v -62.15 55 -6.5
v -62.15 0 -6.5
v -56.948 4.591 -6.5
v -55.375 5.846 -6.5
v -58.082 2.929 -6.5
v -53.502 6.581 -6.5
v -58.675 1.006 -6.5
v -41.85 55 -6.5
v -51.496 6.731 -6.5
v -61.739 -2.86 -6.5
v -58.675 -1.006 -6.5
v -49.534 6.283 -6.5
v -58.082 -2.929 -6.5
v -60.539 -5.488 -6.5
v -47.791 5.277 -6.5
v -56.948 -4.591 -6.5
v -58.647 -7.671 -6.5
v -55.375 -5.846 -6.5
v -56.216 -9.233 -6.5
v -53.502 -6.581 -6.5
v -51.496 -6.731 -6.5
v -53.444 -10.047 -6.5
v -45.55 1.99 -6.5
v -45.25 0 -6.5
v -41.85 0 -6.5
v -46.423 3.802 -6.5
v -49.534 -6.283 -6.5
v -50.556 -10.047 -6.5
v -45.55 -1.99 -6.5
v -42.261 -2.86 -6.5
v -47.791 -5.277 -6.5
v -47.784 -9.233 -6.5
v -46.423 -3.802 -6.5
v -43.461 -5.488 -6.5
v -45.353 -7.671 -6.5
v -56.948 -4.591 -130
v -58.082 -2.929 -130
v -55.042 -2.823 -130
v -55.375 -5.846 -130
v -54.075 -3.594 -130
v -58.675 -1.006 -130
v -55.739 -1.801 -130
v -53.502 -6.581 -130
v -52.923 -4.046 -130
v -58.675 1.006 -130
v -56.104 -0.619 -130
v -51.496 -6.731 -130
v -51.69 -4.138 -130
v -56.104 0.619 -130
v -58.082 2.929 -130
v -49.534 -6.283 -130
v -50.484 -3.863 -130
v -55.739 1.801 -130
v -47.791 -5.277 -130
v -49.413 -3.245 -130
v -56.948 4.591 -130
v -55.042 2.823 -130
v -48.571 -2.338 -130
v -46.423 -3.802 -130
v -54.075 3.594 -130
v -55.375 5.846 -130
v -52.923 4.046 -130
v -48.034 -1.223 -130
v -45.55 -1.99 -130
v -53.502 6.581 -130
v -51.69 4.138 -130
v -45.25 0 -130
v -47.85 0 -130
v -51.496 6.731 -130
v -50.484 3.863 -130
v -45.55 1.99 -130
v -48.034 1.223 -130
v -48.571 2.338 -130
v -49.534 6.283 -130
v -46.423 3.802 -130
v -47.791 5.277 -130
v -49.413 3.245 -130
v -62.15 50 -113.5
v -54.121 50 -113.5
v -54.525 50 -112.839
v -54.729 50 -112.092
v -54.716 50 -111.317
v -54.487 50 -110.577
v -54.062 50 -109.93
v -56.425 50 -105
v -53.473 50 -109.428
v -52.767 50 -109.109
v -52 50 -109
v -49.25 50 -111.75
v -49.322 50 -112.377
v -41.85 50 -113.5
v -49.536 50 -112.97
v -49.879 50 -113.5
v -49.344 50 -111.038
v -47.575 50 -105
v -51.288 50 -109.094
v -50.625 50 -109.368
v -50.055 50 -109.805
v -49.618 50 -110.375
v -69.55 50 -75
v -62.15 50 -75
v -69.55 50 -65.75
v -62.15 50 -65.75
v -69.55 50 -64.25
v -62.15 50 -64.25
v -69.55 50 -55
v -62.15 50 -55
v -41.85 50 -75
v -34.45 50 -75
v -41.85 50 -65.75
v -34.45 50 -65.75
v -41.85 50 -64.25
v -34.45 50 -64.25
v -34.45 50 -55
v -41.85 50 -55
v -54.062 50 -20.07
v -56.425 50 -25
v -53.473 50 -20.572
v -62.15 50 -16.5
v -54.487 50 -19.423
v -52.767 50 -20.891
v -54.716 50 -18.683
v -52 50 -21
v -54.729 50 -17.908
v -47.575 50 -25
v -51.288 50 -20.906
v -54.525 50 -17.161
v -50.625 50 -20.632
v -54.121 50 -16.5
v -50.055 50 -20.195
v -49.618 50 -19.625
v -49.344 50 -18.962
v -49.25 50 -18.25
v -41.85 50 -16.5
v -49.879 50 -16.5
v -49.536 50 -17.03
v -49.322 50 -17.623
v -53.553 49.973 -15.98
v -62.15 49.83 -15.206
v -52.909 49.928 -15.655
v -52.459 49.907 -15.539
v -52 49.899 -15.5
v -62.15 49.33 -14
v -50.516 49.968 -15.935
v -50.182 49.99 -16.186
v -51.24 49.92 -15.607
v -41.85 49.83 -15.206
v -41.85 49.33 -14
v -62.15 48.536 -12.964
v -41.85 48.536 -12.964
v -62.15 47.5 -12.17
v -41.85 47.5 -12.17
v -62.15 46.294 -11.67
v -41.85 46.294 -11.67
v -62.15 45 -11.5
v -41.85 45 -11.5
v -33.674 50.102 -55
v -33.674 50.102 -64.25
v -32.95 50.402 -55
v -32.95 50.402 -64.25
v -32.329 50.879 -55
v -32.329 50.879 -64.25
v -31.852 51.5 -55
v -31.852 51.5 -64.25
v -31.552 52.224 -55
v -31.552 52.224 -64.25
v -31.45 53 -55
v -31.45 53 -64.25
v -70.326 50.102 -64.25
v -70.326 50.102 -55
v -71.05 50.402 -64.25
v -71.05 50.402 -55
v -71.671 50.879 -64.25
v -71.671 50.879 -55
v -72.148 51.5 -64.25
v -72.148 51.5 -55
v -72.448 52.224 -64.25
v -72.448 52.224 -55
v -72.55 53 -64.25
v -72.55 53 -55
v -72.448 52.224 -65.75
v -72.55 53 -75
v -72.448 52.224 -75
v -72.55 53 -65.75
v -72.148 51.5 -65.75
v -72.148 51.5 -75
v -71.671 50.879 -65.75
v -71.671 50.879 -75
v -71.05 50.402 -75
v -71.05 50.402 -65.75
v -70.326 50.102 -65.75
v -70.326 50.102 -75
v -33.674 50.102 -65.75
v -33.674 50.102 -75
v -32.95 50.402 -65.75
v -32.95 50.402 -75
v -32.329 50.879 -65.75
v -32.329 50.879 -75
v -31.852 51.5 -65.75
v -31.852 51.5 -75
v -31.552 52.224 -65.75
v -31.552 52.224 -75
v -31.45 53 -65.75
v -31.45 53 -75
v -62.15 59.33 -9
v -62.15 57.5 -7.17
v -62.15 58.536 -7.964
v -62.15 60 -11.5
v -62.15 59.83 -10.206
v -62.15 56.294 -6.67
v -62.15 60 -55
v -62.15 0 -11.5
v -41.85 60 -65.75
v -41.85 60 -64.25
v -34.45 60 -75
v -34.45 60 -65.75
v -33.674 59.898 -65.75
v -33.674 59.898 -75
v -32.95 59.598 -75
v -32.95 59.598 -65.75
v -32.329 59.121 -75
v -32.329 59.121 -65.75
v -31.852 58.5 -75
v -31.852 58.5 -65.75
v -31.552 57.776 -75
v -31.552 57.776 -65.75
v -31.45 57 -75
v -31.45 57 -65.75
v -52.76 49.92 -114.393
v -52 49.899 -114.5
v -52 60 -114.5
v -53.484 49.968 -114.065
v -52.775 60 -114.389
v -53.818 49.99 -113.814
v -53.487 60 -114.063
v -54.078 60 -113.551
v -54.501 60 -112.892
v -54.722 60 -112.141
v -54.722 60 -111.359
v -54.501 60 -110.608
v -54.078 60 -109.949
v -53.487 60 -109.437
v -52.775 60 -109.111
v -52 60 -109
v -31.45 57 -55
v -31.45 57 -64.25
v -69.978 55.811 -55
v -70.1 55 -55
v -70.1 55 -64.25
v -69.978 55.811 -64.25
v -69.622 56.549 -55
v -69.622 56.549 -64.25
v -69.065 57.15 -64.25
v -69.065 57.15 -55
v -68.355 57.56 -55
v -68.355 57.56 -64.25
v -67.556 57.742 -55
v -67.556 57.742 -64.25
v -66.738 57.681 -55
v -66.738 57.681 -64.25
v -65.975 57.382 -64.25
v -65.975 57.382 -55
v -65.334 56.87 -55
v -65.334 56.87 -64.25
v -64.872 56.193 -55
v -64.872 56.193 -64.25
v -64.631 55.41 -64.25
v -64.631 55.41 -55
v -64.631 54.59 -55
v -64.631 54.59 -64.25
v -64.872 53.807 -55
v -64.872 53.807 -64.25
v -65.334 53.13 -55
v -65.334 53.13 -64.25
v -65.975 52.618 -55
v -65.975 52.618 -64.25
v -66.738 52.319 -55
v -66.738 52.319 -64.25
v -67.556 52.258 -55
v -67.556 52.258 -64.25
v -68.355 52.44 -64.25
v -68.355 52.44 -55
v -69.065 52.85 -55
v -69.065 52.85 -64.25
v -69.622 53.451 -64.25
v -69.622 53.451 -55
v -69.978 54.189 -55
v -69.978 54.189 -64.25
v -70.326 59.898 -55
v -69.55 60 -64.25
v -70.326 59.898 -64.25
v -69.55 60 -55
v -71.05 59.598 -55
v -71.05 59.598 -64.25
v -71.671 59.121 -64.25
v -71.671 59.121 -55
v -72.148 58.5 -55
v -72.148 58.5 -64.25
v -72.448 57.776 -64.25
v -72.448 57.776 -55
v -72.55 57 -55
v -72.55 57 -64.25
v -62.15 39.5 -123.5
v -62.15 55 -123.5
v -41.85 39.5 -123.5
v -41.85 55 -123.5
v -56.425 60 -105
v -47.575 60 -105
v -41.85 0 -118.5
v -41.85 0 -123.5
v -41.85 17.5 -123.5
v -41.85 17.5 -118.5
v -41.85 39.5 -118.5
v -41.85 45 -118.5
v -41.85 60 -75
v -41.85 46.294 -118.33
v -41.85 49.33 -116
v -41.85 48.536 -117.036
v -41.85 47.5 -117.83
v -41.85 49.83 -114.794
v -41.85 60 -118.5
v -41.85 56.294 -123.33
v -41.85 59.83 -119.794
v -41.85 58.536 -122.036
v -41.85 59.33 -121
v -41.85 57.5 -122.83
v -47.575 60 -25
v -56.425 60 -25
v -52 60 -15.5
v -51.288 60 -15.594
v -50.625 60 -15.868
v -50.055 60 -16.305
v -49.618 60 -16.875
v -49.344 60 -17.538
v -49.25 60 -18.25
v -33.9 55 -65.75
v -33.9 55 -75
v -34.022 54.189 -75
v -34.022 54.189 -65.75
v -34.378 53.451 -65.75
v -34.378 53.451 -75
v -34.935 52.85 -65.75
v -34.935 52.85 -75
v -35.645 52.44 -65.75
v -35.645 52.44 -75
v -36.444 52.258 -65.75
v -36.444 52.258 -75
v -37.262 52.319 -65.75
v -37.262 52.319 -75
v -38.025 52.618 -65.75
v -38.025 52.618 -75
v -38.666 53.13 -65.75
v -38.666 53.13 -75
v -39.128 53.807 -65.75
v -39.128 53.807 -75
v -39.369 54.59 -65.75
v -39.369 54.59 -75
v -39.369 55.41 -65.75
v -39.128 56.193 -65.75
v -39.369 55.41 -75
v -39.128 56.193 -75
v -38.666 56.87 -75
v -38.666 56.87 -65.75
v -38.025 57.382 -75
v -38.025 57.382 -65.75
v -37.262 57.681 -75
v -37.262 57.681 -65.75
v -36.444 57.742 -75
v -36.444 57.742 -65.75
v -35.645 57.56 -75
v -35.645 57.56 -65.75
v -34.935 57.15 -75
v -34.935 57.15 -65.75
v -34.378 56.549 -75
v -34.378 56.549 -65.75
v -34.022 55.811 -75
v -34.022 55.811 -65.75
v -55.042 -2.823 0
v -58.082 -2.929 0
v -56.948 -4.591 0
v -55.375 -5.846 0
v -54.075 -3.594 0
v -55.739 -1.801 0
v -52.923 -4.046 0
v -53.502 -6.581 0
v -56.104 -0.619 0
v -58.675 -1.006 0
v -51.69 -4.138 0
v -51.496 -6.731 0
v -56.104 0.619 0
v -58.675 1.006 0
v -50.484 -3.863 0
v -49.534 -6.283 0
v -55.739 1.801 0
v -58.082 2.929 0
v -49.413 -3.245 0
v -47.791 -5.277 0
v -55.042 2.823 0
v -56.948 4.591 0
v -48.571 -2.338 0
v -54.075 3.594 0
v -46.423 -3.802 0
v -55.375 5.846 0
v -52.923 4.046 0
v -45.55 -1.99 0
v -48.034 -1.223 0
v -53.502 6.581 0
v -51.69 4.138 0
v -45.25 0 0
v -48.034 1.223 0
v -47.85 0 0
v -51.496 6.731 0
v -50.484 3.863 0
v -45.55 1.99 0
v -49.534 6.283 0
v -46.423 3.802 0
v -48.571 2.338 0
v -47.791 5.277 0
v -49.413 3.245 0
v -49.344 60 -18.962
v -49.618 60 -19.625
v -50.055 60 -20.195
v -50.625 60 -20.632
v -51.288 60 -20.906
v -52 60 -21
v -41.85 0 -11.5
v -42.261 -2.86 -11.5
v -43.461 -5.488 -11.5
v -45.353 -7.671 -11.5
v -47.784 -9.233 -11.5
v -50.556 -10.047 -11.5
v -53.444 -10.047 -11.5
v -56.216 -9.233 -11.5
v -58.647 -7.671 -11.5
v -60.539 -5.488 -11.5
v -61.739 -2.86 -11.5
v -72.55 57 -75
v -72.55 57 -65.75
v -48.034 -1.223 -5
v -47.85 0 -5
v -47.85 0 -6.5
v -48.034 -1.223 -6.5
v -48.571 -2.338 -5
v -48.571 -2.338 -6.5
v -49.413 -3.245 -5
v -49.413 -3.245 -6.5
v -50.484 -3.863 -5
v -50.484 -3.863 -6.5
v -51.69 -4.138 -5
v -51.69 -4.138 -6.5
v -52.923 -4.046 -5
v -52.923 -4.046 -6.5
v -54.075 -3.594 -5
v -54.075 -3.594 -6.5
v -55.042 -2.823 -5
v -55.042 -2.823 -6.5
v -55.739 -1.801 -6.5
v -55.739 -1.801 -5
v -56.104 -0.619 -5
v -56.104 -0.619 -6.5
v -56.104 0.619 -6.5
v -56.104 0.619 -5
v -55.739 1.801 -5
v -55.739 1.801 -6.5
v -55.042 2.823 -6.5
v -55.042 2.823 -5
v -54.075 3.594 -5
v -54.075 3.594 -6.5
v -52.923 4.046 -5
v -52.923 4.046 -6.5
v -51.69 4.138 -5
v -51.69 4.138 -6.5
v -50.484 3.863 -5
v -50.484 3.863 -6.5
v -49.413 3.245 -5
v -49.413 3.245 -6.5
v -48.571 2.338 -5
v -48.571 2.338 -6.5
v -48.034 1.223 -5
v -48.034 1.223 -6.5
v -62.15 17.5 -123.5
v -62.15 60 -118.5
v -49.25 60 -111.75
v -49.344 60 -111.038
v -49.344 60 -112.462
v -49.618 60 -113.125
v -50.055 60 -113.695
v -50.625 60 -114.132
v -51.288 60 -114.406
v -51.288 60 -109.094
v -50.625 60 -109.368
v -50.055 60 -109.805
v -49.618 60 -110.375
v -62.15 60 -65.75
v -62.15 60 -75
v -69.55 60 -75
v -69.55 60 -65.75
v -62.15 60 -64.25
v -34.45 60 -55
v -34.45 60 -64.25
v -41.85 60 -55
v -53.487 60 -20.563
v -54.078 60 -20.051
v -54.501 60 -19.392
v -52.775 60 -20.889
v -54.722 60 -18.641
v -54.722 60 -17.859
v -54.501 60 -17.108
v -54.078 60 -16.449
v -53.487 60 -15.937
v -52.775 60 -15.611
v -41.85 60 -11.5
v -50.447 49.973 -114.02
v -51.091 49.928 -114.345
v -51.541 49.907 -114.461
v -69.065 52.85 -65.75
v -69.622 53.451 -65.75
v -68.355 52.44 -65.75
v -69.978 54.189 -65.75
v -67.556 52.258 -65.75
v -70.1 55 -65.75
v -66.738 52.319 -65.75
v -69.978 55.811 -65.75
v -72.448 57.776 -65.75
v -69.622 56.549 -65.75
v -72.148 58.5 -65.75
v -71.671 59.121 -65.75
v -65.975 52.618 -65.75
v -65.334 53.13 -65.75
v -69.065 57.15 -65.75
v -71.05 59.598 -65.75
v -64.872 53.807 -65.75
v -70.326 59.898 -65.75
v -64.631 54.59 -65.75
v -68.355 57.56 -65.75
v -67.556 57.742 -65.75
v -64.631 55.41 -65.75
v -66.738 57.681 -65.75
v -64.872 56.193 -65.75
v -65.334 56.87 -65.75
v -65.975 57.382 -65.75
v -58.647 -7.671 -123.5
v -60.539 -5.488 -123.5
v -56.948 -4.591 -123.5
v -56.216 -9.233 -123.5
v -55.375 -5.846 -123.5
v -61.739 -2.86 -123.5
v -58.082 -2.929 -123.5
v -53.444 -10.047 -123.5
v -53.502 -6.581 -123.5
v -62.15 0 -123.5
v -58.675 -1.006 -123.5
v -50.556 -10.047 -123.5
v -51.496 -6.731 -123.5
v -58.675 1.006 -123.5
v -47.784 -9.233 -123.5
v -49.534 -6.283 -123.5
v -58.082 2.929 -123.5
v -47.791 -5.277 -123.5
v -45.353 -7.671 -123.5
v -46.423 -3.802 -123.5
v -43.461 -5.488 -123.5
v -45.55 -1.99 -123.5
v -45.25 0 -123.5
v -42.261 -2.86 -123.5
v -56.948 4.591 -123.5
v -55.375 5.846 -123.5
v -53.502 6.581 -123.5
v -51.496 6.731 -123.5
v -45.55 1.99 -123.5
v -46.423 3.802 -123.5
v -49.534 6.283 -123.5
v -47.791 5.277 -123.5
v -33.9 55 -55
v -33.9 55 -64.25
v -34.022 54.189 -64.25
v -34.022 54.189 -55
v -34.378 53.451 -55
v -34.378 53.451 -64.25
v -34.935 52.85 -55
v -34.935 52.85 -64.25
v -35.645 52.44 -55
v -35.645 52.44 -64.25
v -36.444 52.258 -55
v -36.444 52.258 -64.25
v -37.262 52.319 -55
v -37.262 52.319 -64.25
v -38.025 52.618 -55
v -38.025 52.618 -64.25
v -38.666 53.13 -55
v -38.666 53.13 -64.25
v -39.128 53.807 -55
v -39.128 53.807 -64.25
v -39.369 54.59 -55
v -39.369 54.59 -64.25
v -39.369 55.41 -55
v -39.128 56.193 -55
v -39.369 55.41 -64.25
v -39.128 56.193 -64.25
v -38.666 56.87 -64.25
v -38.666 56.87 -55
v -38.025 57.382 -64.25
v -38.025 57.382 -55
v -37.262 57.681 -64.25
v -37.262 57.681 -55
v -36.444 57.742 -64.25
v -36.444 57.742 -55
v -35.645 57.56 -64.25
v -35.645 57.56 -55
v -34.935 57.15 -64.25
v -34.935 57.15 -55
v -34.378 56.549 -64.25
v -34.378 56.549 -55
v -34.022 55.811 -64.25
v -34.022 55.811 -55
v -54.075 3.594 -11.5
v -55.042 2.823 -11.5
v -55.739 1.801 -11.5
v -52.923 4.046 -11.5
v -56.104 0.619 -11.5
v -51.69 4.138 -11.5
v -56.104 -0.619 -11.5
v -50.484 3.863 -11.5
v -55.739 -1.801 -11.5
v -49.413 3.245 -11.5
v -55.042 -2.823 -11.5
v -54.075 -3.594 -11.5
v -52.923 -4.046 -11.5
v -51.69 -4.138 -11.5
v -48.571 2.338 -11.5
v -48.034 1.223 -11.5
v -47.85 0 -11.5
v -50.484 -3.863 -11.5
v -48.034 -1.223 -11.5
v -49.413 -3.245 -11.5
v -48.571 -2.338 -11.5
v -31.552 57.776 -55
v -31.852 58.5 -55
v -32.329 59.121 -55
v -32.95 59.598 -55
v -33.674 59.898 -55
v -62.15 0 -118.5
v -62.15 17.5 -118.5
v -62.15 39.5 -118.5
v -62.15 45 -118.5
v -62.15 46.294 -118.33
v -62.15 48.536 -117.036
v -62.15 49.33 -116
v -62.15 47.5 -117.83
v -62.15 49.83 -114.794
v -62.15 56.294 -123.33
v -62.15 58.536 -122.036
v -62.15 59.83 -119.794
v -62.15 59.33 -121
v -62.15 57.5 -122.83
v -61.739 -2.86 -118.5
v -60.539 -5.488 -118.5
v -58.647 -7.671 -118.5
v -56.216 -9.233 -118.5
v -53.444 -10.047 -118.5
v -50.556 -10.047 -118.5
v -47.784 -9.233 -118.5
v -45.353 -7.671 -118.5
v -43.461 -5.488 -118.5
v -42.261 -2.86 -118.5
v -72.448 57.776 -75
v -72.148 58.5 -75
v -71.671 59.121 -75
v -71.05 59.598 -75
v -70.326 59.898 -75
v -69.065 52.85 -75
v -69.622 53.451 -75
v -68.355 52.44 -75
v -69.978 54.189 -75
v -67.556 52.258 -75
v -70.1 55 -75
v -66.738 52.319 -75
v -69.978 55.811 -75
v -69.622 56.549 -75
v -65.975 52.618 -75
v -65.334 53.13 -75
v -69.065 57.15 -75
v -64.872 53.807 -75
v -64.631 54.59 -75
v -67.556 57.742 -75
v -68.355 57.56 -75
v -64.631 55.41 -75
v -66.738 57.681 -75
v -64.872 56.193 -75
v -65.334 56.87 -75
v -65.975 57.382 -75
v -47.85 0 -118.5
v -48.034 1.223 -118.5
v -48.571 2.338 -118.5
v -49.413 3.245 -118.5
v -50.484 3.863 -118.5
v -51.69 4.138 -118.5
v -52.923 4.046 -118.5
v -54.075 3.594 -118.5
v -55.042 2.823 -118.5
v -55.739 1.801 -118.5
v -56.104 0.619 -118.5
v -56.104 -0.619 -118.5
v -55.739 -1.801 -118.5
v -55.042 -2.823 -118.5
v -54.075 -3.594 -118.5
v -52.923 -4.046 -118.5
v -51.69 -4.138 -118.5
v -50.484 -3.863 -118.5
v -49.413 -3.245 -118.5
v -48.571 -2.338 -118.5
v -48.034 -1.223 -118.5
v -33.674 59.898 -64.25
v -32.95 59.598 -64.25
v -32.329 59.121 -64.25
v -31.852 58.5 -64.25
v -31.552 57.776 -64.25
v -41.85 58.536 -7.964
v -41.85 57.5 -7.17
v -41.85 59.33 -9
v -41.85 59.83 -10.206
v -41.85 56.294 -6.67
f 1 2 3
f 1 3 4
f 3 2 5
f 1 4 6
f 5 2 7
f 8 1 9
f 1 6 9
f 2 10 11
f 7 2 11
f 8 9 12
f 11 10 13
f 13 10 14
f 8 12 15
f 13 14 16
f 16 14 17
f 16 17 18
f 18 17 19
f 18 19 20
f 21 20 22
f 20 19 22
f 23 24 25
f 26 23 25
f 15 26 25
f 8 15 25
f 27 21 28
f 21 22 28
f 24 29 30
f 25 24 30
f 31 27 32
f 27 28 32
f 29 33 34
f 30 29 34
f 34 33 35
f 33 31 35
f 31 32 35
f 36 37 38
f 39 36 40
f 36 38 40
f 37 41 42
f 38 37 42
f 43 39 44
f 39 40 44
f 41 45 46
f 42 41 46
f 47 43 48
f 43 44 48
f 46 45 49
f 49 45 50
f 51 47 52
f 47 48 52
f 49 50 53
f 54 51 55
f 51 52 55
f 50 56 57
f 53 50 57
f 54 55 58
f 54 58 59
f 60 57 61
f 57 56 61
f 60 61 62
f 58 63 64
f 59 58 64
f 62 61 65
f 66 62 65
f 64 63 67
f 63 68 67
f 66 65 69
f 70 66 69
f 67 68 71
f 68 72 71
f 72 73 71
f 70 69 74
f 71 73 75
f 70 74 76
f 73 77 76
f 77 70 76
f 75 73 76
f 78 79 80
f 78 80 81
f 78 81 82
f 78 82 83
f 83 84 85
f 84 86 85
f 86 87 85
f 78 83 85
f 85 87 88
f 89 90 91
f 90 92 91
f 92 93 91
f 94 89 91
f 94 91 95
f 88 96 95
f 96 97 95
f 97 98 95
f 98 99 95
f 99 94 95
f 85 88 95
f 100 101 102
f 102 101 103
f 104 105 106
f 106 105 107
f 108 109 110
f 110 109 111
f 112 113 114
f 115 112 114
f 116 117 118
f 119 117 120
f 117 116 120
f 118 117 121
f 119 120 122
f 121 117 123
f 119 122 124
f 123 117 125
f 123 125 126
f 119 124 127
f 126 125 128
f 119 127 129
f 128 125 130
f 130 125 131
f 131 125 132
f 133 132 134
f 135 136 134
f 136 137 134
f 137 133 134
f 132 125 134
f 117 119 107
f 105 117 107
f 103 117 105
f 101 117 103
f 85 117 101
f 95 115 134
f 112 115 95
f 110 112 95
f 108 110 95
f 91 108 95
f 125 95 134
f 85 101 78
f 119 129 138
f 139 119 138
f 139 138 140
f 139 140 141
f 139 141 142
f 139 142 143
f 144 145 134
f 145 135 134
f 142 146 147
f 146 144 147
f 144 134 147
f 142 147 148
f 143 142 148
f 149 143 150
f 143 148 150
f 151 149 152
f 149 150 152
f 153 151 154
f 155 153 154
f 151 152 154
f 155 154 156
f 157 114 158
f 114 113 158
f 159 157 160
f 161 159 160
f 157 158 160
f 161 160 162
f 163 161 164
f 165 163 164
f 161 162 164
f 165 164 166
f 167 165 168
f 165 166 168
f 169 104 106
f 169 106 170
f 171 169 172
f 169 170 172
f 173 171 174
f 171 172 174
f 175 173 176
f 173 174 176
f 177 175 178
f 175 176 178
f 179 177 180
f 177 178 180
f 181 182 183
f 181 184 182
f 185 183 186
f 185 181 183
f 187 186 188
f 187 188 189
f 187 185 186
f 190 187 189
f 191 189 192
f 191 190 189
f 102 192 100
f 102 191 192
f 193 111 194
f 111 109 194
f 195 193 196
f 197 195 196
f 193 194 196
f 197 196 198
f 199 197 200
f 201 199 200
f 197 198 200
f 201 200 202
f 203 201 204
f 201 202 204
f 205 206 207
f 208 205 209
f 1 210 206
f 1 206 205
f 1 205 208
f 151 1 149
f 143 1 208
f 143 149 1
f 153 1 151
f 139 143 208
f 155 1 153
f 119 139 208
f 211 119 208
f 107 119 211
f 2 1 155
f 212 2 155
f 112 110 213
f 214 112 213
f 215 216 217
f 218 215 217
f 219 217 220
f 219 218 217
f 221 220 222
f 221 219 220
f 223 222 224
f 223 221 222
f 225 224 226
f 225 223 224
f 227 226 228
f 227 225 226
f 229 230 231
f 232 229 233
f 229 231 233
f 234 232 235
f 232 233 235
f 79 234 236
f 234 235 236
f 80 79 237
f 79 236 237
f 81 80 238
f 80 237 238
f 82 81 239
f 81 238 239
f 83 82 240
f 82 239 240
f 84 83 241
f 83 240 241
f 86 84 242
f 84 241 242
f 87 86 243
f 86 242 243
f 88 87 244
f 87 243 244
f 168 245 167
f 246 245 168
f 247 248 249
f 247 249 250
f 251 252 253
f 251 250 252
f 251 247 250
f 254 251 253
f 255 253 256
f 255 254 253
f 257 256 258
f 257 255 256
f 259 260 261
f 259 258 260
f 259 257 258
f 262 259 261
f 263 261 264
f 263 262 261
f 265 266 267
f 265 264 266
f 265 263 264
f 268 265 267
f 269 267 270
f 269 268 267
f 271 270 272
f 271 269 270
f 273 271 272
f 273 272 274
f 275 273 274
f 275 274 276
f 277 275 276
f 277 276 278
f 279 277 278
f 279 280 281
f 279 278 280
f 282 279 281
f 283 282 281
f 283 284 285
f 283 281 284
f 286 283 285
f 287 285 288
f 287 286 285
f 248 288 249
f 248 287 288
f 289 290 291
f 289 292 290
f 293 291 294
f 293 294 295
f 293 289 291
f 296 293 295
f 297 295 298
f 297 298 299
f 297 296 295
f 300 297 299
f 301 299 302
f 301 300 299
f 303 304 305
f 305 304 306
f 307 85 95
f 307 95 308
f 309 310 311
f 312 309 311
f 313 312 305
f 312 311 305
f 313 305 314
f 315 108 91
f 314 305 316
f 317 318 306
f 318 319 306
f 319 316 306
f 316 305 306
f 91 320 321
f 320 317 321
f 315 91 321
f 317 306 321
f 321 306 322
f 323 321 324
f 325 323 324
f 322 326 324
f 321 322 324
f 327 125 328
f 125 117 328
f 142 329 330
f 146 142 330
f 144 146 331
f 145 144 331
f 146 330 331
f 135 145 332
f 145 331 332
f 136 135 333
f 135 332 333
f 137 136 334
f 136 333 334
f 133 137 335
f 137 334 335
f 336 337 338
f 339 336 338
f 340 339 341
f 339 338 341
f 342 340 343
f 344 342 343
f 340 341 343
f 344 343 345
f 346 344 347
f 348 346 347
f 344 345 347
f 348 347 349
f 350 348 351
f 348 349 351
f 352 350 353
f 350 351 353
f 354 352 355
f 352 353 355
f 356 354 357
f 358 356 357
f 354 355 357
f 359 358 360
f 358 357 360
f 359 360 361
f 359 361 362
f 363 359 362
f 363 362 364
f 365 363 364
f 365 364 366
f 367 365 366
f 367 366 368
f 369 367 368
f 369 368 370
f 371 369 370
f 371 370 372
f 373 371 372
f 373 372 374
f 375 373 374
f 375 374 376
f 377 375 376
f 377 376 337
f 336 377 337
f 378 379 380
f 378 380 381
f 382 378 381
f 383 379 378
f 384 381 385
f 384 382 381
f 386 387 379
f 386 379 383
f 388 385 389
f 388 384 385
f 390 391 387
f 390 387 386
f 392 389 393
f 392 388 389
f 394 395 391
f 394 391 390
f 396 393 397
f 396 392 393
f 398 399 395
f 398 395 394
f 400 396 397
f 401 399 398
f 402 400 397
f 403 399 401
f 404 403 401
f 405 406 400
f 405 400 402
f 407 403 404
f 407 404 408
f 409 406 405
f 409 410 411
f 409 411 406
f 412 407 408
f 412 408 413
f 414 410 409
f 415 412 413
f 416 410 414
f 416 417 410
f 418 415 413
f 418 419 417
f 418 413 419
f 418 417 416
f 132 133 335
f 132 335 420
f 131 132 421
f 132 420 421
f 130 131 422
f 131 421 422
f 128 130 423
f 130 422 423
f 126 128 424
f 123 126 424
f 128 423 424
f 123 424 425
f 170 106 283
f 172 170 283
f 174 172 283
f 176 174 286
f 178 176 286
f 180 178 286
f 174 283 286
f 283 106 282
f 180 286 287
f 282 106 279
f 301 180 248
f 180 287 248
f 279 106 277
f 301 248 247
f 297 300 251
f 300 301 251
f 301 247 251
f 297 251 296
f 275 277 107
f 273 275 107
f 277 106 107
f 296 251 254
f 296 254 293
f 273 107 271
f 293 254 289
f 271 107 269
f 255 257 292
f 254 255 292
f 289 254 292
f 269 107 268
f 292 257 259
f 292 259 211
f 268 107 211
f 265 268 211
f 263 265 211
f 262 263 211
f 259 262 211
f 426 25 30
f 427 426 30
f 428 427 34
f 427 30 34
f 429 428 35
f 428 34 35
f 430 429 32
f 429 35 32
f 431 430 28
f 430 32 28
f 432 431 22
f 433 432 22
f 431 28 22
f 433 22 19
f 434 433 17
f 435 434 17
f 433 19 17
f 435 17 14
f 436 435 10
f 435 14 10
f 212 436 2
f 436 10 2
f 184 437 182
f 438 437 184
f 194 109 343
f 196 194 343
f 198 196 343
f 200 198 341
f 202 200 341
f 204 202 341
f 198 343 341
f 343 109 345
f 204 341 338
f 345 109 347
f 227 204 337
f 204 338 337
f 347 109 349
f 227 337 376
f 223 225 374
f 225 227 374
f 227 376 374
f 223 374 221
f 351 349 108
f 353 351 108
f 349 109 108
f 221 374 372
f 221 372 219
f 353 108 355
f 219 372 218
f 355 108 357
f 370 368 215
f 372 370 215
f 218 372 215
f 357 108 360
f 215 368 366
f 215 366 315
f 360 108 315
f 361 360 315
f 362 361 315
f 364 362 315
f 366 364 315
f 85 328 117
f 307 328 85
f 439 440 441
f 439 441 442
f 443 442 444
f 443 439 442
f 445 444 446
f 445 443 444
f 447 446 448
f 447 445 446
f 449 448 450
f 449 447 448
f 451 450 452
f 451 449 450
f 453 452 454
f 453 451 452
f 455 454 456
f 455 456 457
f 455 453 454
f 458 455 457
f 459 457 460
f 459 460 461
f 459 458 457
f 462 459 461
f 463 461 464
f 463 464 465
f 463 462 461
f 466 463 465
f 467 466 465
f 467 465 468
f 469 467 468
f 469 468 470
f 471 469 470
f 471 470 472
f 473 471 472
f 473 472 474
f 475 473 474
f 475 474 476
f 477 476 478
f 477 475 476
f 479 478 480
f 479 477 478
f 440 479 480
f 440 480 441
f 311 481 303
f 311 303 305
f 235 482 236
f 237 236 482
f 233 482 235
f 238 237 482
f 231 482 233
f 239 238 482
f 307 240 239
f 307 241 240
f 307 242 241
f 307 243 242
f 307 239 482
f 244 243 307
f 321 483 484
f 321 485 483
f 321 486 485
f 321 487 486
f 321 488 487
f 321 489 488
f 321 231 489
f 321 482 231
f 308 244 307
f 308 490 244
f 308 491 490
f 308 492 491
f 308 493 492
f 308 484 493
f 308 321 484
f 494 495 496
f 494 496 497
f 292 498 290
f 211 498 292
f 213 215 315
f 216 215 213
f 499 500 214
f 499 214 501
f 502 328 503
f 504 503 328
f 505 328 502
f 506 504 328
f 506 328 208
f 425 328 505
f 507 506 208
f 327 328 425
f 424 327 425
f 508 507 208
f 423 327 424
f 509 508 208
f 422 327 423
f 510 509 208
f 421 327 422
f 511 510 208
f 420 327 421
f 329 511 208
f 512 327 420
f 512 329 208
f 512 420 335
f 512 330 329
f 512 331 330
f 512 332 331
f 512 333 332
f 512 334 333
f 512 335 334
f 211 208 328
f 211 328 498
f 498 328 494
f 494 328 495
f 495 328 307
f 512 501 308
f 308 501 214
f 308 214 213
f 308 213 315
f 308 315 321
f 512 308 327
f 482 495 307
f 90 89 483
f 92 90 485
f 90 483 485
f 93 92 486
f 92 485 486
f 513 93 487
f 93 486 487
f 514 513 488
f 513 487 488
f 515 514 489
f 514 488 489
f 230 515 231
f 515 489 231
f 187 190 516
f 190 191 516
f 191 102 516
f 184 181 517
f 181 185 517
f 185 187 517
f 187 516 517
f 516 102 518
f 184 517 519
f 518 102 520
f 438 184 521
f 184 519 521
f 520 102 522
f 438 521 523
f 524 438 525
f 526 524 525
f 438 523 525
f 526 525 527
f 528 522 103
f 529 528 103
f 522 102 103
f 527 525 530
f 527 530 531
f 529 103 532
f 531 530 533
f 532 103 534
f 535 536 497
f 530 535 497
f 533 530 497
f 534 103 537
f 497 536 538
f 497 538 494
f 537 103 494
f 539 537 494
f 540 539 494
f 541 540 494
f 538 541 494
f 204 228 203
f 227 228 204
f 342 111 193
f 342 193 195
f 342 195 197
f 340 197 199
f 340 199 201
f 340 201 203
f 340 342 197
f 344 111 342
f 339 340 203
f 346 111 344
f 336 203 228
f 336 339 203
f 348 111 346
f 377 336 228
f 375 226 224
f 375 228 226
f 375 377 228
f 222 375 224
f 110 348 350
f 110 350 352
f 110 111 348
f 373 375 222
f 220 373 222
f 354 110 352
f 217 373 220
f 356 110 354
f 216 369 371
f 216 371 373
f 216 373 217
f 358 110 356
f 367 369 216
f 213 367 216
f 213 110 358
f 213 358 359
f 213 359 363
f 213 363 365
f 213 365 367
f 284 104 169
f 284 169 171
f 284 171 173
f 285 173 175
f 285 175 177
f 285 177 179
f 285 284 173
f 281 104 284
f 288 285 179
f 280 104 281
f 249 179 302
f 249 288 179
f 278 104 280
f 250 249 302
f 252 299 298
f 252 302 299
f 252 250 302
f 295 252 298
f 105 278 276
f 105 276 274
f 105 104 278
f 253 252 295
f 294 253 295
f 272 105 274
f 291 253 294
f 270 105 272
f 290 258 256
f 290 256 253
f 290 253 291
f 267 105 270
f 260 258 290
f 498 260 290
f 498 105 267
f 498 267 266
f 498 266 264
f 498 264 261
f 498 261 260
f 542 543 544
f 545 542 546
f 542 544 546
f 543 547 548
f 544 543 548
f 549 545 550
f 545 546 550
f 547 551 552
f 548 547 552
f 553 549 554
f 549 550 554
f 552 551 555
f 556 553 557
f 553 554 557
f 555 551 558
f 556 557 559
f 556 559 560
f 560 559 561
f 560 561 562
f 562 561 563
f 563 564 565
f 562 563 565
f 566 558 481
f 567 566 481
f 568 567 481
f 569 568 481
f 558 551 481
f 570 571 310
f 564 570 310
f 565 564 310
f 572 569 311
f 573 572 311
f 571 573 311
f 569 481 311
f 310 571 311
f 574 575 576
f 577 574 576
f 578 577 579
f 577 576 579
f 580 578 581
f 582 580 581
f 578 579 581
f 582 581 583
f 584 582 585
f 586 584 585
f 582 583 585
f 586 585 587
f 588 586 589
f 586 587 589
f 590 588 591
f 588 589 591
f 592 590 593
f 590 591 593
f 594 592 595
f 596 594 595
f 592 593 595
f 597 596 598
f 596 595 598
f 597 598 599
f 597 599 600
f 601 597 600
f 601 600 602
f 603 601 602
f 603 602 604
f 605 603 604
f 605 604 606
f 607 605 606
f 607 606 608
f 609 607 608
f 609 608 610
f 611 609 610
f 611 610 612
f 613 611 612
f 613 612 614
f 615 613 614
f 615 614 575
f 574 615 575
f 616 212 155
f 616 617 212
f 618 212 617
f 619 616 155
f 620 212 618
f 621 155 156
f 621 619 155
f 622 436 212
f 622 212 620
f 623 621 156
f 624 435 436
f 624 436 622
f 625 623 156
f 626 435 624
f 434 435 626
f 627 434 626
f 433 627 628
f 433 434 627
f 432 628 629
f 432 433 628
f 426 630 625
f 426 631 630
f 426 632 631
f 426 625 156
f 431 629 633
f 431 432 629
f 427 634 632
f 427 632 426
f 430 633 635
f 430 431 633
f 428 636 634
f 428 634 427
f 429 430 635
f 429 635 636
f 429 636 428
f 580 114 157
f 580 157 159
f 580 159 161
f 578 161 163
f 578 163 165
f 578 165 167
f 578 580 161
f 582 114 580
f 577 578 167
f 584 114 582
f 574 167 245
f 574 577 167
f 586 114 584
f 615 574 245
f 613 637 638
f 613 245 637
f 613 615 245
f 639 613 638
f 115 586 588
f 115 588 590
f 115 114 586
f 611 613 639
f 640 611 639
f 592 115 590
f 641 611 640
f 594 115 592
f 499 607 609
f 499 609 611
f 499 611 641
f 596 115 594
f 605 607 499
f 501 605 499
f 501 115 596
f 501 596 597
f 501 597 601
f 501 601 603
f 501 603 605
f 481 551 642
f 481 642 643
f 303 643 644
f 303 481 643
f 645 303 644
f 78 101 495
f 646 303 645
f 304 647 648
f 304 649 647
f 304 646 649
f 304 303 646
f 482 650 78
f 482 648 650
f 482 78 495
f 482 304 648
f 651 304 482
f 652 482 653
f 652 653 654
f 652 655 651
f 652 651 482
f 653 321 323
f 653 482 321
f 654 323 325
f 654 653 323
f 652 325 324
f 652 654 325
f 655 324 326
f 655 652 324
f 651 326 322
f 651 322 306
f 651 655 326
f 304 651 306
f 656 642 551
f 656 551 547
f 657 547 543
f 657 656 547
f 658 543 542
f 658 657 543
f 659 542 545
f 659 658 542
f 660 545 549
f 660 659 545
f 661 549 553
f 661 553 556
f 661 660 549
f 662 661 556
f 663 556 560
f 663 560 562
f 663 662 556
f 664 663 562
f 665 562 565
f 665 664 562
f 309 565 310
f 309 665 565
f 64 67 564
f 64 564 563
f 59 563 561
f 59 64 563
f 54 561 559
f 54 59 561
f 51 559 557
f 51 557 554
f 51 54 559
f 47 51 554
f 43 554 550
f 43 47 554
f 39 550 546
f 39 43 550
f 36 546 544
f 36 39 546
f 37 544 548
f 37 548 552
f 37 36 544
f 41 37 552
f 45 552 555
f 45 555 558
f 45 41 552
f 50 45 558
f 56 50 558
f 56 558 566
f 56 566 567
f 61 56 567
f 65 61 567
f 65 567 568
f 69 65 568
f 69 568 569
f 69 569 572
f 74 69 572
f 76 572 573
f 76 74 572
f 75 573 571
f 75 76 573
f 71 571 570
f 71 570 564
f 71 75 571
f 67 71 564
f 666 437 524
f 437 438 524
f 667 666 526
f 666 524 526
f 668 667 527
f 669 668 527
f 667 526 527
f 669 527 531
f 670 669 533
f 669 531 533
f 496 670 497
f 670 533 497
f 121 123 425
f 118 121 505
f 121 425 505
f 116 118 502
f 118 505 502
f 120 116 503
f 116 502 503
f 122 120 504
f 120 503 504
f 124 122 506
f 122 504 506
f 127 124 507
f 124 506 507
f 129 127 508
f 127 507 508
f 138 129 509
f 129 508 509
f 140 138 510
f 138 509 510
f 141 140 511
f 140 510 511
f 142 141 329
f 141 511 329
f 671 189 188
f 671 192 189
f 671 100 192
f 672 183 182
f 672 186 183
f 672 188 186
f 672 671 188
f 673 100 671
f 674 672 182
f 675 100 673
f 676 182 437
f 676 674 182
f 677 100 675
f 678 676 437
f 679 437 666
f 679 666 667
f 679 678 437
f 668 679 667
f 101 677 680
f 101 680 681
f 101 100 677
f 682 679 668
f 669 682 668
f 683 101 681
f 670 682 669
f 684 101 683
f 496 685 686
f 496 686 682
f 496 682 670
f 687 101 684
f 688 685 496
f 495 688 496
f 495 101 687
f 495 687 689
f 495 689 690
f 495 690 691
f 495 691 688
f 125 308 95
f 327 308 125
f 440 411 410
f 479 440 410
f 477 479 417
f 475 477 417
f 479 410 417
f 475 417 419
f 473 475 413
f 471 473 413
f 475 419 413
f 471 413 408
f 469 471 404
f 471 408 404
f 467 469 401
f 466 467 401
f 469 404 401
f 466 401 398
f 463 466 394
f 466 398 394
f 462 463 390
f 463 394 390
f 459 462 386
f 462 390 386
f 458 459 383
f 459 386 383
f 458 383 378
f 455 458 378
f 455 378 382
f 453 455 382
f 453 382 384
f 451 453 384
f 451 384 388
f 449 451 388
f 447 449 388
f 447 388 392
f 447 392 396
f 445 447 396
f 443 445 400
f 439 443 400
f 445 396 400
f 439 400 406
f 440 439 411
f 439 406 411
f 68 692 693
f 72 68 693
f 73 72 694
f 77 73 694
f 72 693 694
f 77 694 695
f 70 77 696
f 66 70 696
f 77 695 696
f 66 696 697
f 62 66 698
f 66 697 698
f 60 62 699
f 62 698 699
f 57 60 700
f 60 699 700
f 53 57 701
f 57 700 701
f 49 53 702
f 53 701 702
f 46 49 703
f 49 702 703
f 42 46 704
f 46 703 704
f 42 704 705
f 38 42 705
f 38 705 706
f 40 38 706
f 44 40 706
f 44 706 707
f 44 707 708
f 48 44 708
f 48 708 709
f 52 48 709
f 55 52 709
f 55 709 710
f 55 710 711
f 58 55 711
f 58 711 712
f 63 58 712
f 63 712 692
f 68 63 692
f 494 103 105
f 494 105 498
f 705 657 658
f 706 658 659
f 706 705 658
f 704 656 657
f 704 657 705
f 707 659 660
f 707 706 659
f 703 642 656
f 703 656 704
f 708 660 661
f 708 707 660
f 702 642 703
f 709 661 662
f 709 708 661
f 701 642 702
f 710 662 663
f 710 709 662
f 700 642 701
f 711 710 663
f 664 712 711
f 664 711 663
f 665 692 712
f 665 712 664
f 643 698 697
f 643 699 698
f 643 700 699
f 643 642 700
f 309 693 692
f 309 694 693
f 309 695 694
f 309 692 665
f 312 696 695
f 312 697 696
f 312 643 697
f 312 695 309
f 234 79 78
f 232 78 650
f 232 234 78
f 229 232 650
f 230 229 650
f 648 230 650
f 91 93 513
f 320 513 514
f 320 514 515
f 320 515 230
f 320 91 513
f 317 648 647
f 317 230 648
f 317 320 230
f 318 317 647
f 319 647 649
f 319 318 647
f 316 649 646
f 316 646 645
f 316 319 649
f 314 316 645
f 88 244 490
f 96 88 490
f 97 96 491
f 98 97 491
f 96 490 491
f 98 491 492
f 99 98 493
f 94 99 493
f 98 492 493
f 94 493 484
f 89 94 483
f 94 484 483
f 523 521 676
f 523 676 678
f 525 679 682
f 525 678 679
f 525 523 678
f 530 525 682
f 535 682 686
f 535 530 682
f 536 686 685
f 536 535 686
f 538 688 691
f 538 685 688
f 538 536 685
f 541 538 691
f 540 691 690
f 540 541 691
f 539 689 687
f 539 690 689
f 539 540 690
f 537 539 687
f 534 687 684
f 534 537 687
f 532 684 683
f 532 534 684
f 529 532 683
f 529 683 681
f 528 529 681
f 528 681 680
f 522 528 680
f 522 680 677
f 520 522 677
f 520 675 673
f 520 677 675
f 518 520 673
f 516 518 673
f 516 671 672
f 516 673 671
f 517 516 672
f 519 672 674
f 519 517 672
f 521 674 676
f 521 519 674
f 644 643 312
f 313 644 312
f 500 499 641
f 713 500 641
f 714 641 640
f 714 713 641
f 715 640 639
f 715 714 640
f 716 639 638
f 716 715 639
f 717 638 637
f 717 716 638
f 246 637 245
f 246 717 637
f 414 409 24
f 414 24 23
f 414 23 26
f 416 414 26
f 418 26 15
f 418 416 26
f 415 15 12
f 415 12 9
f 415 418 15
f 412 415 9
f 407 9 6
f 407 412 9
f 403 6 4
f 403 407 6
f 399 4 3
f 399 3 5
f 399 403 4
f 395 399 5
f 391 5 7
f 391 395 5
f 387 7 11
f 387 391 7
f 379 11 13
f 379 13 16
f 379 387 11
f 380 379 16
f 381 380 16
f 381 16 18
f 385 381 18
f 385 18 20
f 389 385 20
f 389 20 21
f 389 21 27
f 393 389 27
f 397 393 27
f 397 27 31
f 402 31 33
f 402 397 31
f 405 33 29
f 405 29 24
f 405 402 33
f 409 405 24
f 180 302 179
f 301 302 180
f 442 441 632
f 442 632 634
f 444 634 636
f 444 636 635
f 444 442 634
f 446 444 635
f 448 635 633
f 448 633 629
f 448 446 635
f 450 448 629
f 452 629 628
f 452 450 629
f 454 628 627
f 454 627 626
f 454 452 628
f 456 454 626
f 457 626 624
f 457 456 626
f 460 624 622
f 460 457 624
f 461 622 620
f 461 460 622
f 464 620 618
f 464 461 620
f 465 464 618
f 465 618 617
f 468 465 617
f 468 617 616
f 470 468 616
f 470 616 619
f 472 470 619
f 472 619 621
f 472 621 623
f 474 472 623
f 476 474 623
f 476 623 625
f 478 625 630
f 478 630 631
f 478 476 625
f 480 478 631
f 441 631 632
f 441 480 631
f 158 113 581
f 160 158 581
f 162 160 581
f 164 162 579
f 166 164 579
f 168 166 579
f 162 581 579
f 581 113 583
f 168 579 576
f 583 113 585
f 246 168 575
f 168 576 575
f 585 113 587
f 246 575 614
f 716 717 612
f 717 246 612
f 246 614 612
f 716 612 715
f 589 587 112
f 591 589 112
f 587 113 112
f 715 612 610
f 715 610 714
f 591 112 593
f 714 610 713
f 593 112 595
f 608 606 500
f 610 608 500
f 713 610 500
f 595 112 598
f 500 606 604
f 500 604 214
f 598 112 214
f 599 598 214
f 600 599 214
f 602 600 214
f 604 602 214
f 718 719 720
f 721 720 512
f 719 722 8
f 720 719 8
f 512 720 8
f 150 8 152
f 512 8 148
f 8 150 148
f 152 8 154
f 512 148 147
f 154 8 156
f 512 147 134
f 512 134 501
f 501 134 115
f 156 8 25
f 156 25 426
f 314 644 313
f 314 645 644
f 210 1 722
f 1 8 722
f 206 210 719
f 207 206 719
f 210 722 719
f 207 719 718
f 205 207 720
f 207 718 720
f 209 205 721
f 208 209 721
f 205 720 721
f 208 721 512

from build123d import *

# Parameters (mm, degrees)
SKETCH1_R               = 7.15
SKETCH1_R_2             = 4.15
BOSS_EXTRUDE1_DEPTH     = 5
SKETCH2_R               = 7.15
SKETCH2_R_2             = 4.15
BOSS_EXTRUDE2_DEPTH     = 5
BOSS_EXTRUDE3_START     = 1.5
SKETCH3_R               = 7.15
SKETCH3_R_2             = 4.15
BOSS_EXTRUDE3_DEPTH     = 1.5
SKETCH4_R               = 7.15
SKETCH4_R_2             = 4.15
BOSS_EXTRUDE4_DEPTH     = 1.5
SKETCH5_R               = 7.15
SKETCH5_R_2             = 4.15
BOSS_EXTRUDE5_DEPTH     = 5
BOSS_EXTRUDE6_START     = 5
SKETCH6_R               = 4.15
BOSS_EXTRUDE6_DEPTH     = 5
SKETCH7_W               = 20.3
SKETCH7_H               = 10
BOSS_EXTRUDE7_DEPTH     = 107
SKETCH8_R               = 4.15
CUT_EXTRUDE1_DEPTH      = 153.570131415
FILLET1_R               = 5
CUT_EXTRUDE3_DEPTH      = 18.9
SKETCH11_R              = 7.15
SKETCH11_R_2            = 6.75
CUT_EXTRUDE4_DEPTH      = 6.5
SKETCH12_R              = 7.15
SKETCH12_R_2            = 6.75
CUT_EXTRUDE5_DEPTH      = 6.5
CUT_EXTRUDE6_DEPTH      = 18.9
SKETCH14_W              = 9.25
SKETCH14_H              = 10
BOSS_EXTRUDE8_DEPTH     = 0.4
SKETCH15_W              = 9.25
SKETCH15_H              = 10
BOSS_EXTRUDE9_DEPTH     = 0.4
SKETCH17_W              = 9.25
SKETCH17_H              = 10
BOSS_EXTRUDE10_DEPTH    = 10
CUT_EXTRUDE7_DEPTH      = 26
SKETCH20_W              = 9.25
SKETCH20_H              = 10
BOSS_EXTRUDE11_DEPTH    = 10
CUT_EXTRUDE8_DEPTH      = 112.751968699
CUT_EXTRUDE8_DEPTH_BACK = 112.751968699
FILLET2_R               = 3
SKETCH23_W              = 117
SKETCH23_H              = 2
CUT_EXTRUDE9_DEPTH      = 37
SKETCH24_W              = 20.3
SKETCH24_H              = 5
BOSS_EXTRUDE12_DEPTH    = 22
SKETCH25_W              = 80
SKETCH25_H              = 10
CUT_EXTRUDE10_DEPTH     = 0.2
SKETCH26_W              = 80
SKETCH26_H              = 10
CUT_EXTRUDE11_DEPTH     = 0.2


with BuildPart() as part:
    # Sketch1 → Boss-Extrude1 (new body)
    with BuildSketch(Plane.XY):
        with Locations((-52, 0)):
            Circle(SKETCH1_R)
        with Locations((-52, 0)):
            Circle(SKETCH1_R_2, mode=Mode.SUBTRACT)
    extrude(amount=-BOSS_EXTRUDE1_DEPTH)

    # Sketch4 → Boss-Extrude4 (add)
    with BuildSketch(Plane(origin=(0, 0, -5), x_dir=(-1, 0, 0), z_dir=(0, 0, -1))):
        with Locations(Location((52, 0, 0), (0, 0, 180))):
            Circle(SKETCH4_R)
        with Locations(Location((52, 0, 0), (0, 0, 180))):
            Circle(SKETCH4_R_2, mode=Mode.SUBTRACT)
    extrude(amount=BOSS_EXTRUDE4_DEPTH)

    # Sketch5 → Boss-Extrude5 (add)
    # profile 1 of 6: a face of its own
    with BuildSketch(Plane(origin=(0, 0, -6.5), x_dir=(-1, 0, 0), z_dir=(0, 0, -1))):
        with Locations(Location((52, 0, 0), (0, 0, 180))):
            Circle(SKETCH5_R)
        with Locations(Location((52, 0, 0), (0, 0, 180))):
            Circle(SKETCH5_R_2, mode=Mode.SUBTRACT)
    # profile 2 of 6: a face of its own
    with BuildSketch(Plane(origin=(0, 0, -6.5), x_dir=(-1, 0, 0), z_dir=(0, 0, -1))):
        with BuildLine():
            ThreePointArc((44.85, 0), (52, 7.15), (59.15, 0))
            Line((59.15, 0), (62.15, 0))
            ThreePointArc((62.15, 0), (52, 10.15), (41.85, 0))
            Line((41.85, 0), (44.85, 0))
        make_face()
    # profile 3 of 6: a face of its own
    with BuildSketch(Plane(origin=(0, 0, -6.5), x_dir=(-1, 0, 0), z_dir=(0, 0, -1))):
        with BuildLine():
            Line((62.15, 0), (59.15, 0))
            ThreePointArc((59.15, 0), (52, -7.15), (44.85, 0))
            Line((44.85, 0), (41.85, 0))
            ThreePointArc((41.85, 0), (52, -10.15), (62.15, 0))
        make_face()
    # profile 4 of 6: a face of its own
    with BuildSketch(Plane(origin=(0, 0, -6.5), x_dir=(-1, 0, 0), z_dir=(0, 0, -1))):
        with BuildLine():
            ThreePointArc((44.85, 0), (52, 7.15), (59.15, 0))
            Line((59.15, 0), (62.15, 0))
            ThreePointArc((62.15, 0), (52, 10.15), (41.85, 0))
            Line((41.85, 0), (44.85, 0))
        make_face()
    # profile 5 of 6: a face of its own
    with BuildSketch(Plane(origin=(0, 0, -6.5), x_dir=(-1, 0, 0), z_dir=(0, 0, -1))):
        with BuildLine():
            Line((62.15, 0), (59.15, 0))
            ThreePointArc((59.15, 0), (52, -7.15), (44.85, 0))
            Line((44.85, 0), (41.85, 0))
            ThreePointArc((41.85, 0), (52, -10.15), (62.15, 0))
        make_face()
    # profile 6 of 6: a face of its own
    with BuildSketch(Plane(origin=(0, 0, -6.5), x_dir=(-1, 0, 0), z_dir=(0, 0, -1))):
        with BuildLine():
            ThreePointArc((41.85, 0), (52, 10.15), (62.15, 0))
            Line((62.15, 0), (62.15, 40))
            Line((62.15, 40), (41.85, 40))
            Line((41.85, 40), (41.85, 0))
        make_face()
    extrude(amount=BOSS_EXTRUDE5_DEPTH)



with BuildPart() as body_2:
    # Sketch2 → Boss-Extrude2 (new body)
    with BuildSketch(Plane.XY.offset(-125)):
        with Locations((-52, 0)):
            Circle(SKETCH2_R)
        with Locations((-52, 0)):
            Circle(SKETCH2_R_2, mode=Mode.SUBTRACT)
    extrude(amount=-BOSS_EXTRUDE2_DEPTH)

    # Sketch3 → Boss-Extrude3 (add)
    with BuildSketch(Plane.XY.offset(-125).offset(BOSS_EXTRUDE3_START)):
        with Locations((-52, 0)):
            Circle(SKETCH3_R)
        with Locations((-52, 0)):
            Circle(SKETCH3_R_2, mode=Mode.SUBTRACT)
    extrude(amount=-BOSS_EXTRUDE3_DEPTH)

    # Sketch6 → Boss-Extrude6 (add)
    with BuildSketch(Plane.XY.offset(-123.5).offset(BOSS_EXTRUDE6_START)):
        with BuildLine():
            Line((-62.15, 40), (-62.15, 0))
            ThreePointArc((-62.15, 0), (-52, -10.15), (-41.85, 0))
            Line((-41.85, 0), (-41.85, 40))
            Line((-41.85, 40), (-62.15, 40))
        make_face()
        with Locations((-52, 0)):
            Circle(SKETCH6_R, mode=Mode.SUBTRACT)
    extrude(amount=-BOSS_EXTRUDE6_DEPTH)


with BuildPart() as part_1:
    add(part.part)

    add(body_2.part)  # Boss-Extrude7 merges body 2
    # Sketch7 → Boss-Extrude7 (add)
    with BuildSketch(Plane.XY.offset(-118.5)):
        with Locations((-52, 35)):
            Rectangle(SKETCH7_W, SKETCH7_H)
    extrude(amount=BOSS_EXTRUDE7_DEPTH)

    # Sketch8 → Cut-Extrude1 (cut, through all)
    with BuildSketch(Plane(origin=(0, 40, 0), x_dir=(1, 0, 0), z_dir=(0, 1, 0))):
        with Locations(Location((-52, 65, 0), (0, 0, 270))):
            Circle(SKETCH8_R)
    extrude(amount=-CUT_EXTRUDE1_DEPTH, mode=Mode.SUBTRACT)

    # Fillet1
    fillet1_edges = [part_1.edges().sort_by_distance(p)[0] for p in [
        (-52, 40, -6.5),
        (-52, 30, -11.5),
        (-52, 30, -118.5),
        (-52, 40, -123.5),
    ]]
    fillet(fillet1_edges, radius=FILLET1_R)

    # Sketch10 → Cut-Extrude3 (cut)
    with BuildSketch(Plane(origin=(0, 40, 0), x_dir=(1, 0, 0), z_dir=(0, 1, 0))):
        with BuildLine():
            Line((-56.225, 65), (-56.225, 25))
            Line((-56.225, 25), (-47.775, 25))
            Line((-47.775, 25), (-47.775, 65))
            ThreePointArc((-47.775, 65), (-52, 60.775), (-56.225, 65))
        make_face()
        with BuildLine():
            Line((-56.225, 105), (-56.225, 65))
            ThreePointArc((-56.225, 65), (-52, 69.225), (-47.775, 65))
            Line((-47.775, 65), (-47.775, 105))
            Line((-47.775, 105), (-56.225, 105))
        make_face()
    extrude(amount=-CUT_EXTRUDE3_DEPTH, mode=Mode.SUBTRACT)


with BuildPart() as cut_extrude3_kept_piece:
    # of the separate pieces the step leaves, the one the design keeps (cut_extrude3_pieces_kept)
    add(part_1.part.solids().sort_by_distance((-41.85, 35, -123.5))[0])

    # Sketch11 → Cut-Extrude4 (cut)
    with BuildSketch(Plane.XY):
        with Locations((-52, 0)):
            Circle(SKETCH11_R)
        with Locations((-52, 0)):
            Circle(SKETCH11_R_2, mode=Mode.SUBTRACT)
    extrude(amount=-CUT_EXTRUDE4_DEPTH, mode=Mode.SUBTRACT)

    # Sketch12 → Cut-Extrude5 (cut)
    with BuildSketch(Plane(origin=(0, 0, -130), x_dir=(-1, 0, 0), z_dir=(0, 0, -1))):
        with Locations((52, 0)):
            Circle(SKETCH12_R)
        with Locations(Location((52, 0, 0), (0, 0, 180))):
            Circle(SKETCH12_R_2, mode=Mode.SUBTRACT)
    extrude(amount=-CUT_EXTRUDE5_DEPTH, mode=Mode.SUBTRACT)

    # Sketch13 → Cut-Extrude6 (cut)
    with BuildSketch(Plane(origin=(0, 40, 0), x_dir=(1, 0, 0), z_dir=(0, 1, 0))):
        with BuildLine():
            ThreePointArc((-52, 21), (-54.75, 18.25), (-52, 15.5))
            Line((-52, 15.5), (-52, 21))
        make_face()
        with BuildLine():
            Line((-52, 21), (-52, 15.5))
            ThreePointArc((-52, 15.5), (-50.055456352, 16.305456352), (-49.25, 18.25))
            ThreePointArc((-49.25, 18.25), (-50.055456352, 20.194543648), (-52, 21))
        make_face()
        with BuildLine():
            ThreePointArc((-52, 114.5), (-54.75, 111.75), (-52, 109))
            Line((-52, 109), (-52, 114.5))
        make_face()
        with BuildLine():
            Line((-52, 114.5), (-52, 109))
            ThreePointArc((-52, 109), (-50.055456352, 109.805456352), (-49.25, 111.75))
            ThreePointArc((-49.25, 111.75), (-50.055456352, 113.694543648), (-52, 114.5))
        make_face()
    extrude(amount=-CUT_EXTRUDE6_DEPTH, mode=Mode.SUBTRACT)

    # Sketch14 → Boss-Extrude8 (add)
    with BuildSketch(Plane(origin=(-41.85, 0, 0), x_dir=(0, 0, -1), z_dir=(1, 0, 0))):
        with Locations((59.625, 35)):
            Rectangle(SKETCH14_W, SKETCH14_H)
        with Locations((70.375, 35)):
            Rectangle(SKETCH14_W, SKETCH14_H)
    extrude(amount=BOSS_EXTRUDE8_DEPTH)

    # Sketch15 → Boss-Extrude9 (add)
    with BuildSketch(Plane.ZY.offset(62.15)):
        with Locations((-59.625, 35)):
            Rectangle(SKETCH15_W, SKETCH15_H)
        with Locations((-70.375, 35)):
            Rectangle(SKETCH15_W, SKETCH15_H)
    extrude(amount=BOSS_EXTRUDE9_DEPTH)

    # Sketch17 → Boss-Extrude10 (add)
    with BuildSketch(Plane(origin=(-41.45, 0, 0), x_dir=(0, 0, -1), z_dir=(1, 0, 0))):
        with Locations((59.625, 35)):
            Rectangle(SKETCH17_W, SKETCH17_H)
        with Locations((70.375, 35)):
            Rectangle(SKETCH17_W, SKETCH17_H)
    extrude(amount=BOSS_EXTRUDE10_DEPTH)

    # Sketch18 → Cut-Extrude7 (cut)
    with BuildSketch(Plane(origin=(0, 0, -75), x_dir=(-1, 0, 0), z_dir=(0, 0, -1))):
        with BuildLine():
            ThreePointArc((39.4, 35), (36.65, 37.75), (33.9, 35))
            Line((33.9, 35), (39.4, 35))
        make_face()
        with BuildLine():
            Line((39.4, 35), (33.9, 35))
            ThreePointArc((33.9, 35), (36.65, 32.25), (39.4, 35))
        make_face()
    extrude(amount=-CUT_EXTRUDE7_DEPTH, mode=Mode.SUBTRACT)

    # Sketch20 → Boss-Extrude11 (add)
    with BuildSketch(Plane.ZY.offset(62.55)):
        with Locations((-70.375, 35)):
            Rectangle(SKETCH20_W, SKETCH20_H)
        with Locations((-59.625, 35)):
            Rectangle(SKETCH20_W, SKETCH20_H)
    extrude(amount=BOSS_EXTRUDE11_DEPTH)

    # Sketch21 → Cut-Extrude8 (cut, two sides: drawn at the far end of the back side and taken through both)
    with BuildSketch(Plane(origin=(0, 0, -75), x_dir=(-1, 0, 0), z_dir=(0, 0, -1)).offset(-CUT_EXTRUDE8_DEPTH_BACK)):
        with BuildLine():
            ThreePointArc((64.6, 35), (67.35, 32.25), (70.1, 35))
            Line((70.1, 35), (64.6, 35))
        make_face()
        with BuildLine():
            Line((64.6, 35), (70.1, 35))
            ThreePointArc((70.1, 35), (67.35, 37.75), (64.6, 35))
        make_face()
    extrude(amount=CUT_EXTRUDE8_DEPTH + CUT_EXTRUDE8_DEPTH_BACK, mode=Mode.SUBTRACT)

    # Fillet2
    fillet2_edges = [cut_extrude3_kept_piece.edges().sort_by_distance(p)[0] for p in [
        (-31.45, 40, -59.625),
        (-31.45, 30, -59.625),
        (-31.45, 30, -70.375),
        (-31.45, 40, -70.375),
        (-72.55, 30, -70.375),
        (-72.55, 40, -70.375),
        (-72.55, 40, -59.625),
        (-72.55, 30, -59.625),
    ]]
    fillet(fillet2_edges, radius=FILLET2_R)

    # Sketch23 → Cut-Extrude9 (cut)
    with BuildSketch(Plane(origin=(-41.85, 0, 0), x_dir=(0, 0, -1), z_dir=(1, 0, 0))):
        with Locations((65, 18.5)):
            Rectangle(SKETCH23_W, SKETCH23_H)
    extrude(amount=-CUT_EXTRUDE9_DEPTH, mode=Mode.SUBTRACT)


with BuildPart() as cut_extrude9_piece_1:
    # of the separate pieces the step leaves, piece 1, a body of its own (cut_extrude9_pieces)
    add(cut_extrude3_kept_piece.part.solids().sort_by_distance((-34.45, 30, -75))[0])


with BuildPart() as cut_extrude9_piece_2:
    # of the separate pieces the step leaves, piece 2, a body of its own (cut_extrude9_pieces)
    add(cut_extrude3_kept_piece.part.solids().sort_by_distance((-41.85, 0, -118.5))[0])


with BuildPart() as cut_extrude9_piece_3:
    # of the separate pieces the step leaves, piece 3, a body of its own (cut_extrude9_pieces)
    add(cut_extrude3_kept_piece.part.solids().sort_by_distance((-41.85, 17.5, -6.5))[0])


with BuildPart() as cut_extrude9_piece_1_1:
    # Body-Move/Copy1: moved
    add(cut_extrude9_piece_1.part.moved(Location((0, 20, 0))))


    add(cut_extrude9_piece_2.part)  # Boss-Extrude12 merges Cut-Extrude9 piece 2

    add(cut_extrude9_piece_3.part)  # Boss-Extrude12 merges Cut-Extrude9 piece 3
    # Sketch24 → Boss-Extrude12 (add)
    with BuildSketch(Plane(origin=(0, 17.5, 0), x_dir=(1, 0, 0), z_dir=(0, 1, 0))):
        with Locations((-52, 9)):
            Rectangle(SKETCH24_W, SKETCH24_H)
        with Locations((-52, 121)):
            Rectangle(SKETCH24_W, SKETCH24_H)
    extrude(amount=BOSS_EXTRUDE12_DEPTH)

    # Sketch25 → Cut-Extrude10 (cut)
    with BuildSketch(Plane(origin=(-56.225, 0, 0), x_dir=(0, 0, -1), z_dir=(1, 0, 0))):
        with Locations((65, 55)):
            Rectangle(SKETCH25_W, SKETCH25_H)
    extrude(amount=-CUT_EXTRUDE10_DEPTH, mode=Mode.SUBTRACT)

    # Sketch26 → Cut-Extrude11 (cut)
    with BuildSketch(Plane.ZY.offset(47.775)):
        with Locations((-65, 55)):
            Rectangle(SKETCH26_W, SKETCH26_H)
    extrude(amount=-CUT_EXTRUDE11_DEPTH, mode=Mode.SUBTRACT)


solid = cut_extrude9_piece_1_1.part
